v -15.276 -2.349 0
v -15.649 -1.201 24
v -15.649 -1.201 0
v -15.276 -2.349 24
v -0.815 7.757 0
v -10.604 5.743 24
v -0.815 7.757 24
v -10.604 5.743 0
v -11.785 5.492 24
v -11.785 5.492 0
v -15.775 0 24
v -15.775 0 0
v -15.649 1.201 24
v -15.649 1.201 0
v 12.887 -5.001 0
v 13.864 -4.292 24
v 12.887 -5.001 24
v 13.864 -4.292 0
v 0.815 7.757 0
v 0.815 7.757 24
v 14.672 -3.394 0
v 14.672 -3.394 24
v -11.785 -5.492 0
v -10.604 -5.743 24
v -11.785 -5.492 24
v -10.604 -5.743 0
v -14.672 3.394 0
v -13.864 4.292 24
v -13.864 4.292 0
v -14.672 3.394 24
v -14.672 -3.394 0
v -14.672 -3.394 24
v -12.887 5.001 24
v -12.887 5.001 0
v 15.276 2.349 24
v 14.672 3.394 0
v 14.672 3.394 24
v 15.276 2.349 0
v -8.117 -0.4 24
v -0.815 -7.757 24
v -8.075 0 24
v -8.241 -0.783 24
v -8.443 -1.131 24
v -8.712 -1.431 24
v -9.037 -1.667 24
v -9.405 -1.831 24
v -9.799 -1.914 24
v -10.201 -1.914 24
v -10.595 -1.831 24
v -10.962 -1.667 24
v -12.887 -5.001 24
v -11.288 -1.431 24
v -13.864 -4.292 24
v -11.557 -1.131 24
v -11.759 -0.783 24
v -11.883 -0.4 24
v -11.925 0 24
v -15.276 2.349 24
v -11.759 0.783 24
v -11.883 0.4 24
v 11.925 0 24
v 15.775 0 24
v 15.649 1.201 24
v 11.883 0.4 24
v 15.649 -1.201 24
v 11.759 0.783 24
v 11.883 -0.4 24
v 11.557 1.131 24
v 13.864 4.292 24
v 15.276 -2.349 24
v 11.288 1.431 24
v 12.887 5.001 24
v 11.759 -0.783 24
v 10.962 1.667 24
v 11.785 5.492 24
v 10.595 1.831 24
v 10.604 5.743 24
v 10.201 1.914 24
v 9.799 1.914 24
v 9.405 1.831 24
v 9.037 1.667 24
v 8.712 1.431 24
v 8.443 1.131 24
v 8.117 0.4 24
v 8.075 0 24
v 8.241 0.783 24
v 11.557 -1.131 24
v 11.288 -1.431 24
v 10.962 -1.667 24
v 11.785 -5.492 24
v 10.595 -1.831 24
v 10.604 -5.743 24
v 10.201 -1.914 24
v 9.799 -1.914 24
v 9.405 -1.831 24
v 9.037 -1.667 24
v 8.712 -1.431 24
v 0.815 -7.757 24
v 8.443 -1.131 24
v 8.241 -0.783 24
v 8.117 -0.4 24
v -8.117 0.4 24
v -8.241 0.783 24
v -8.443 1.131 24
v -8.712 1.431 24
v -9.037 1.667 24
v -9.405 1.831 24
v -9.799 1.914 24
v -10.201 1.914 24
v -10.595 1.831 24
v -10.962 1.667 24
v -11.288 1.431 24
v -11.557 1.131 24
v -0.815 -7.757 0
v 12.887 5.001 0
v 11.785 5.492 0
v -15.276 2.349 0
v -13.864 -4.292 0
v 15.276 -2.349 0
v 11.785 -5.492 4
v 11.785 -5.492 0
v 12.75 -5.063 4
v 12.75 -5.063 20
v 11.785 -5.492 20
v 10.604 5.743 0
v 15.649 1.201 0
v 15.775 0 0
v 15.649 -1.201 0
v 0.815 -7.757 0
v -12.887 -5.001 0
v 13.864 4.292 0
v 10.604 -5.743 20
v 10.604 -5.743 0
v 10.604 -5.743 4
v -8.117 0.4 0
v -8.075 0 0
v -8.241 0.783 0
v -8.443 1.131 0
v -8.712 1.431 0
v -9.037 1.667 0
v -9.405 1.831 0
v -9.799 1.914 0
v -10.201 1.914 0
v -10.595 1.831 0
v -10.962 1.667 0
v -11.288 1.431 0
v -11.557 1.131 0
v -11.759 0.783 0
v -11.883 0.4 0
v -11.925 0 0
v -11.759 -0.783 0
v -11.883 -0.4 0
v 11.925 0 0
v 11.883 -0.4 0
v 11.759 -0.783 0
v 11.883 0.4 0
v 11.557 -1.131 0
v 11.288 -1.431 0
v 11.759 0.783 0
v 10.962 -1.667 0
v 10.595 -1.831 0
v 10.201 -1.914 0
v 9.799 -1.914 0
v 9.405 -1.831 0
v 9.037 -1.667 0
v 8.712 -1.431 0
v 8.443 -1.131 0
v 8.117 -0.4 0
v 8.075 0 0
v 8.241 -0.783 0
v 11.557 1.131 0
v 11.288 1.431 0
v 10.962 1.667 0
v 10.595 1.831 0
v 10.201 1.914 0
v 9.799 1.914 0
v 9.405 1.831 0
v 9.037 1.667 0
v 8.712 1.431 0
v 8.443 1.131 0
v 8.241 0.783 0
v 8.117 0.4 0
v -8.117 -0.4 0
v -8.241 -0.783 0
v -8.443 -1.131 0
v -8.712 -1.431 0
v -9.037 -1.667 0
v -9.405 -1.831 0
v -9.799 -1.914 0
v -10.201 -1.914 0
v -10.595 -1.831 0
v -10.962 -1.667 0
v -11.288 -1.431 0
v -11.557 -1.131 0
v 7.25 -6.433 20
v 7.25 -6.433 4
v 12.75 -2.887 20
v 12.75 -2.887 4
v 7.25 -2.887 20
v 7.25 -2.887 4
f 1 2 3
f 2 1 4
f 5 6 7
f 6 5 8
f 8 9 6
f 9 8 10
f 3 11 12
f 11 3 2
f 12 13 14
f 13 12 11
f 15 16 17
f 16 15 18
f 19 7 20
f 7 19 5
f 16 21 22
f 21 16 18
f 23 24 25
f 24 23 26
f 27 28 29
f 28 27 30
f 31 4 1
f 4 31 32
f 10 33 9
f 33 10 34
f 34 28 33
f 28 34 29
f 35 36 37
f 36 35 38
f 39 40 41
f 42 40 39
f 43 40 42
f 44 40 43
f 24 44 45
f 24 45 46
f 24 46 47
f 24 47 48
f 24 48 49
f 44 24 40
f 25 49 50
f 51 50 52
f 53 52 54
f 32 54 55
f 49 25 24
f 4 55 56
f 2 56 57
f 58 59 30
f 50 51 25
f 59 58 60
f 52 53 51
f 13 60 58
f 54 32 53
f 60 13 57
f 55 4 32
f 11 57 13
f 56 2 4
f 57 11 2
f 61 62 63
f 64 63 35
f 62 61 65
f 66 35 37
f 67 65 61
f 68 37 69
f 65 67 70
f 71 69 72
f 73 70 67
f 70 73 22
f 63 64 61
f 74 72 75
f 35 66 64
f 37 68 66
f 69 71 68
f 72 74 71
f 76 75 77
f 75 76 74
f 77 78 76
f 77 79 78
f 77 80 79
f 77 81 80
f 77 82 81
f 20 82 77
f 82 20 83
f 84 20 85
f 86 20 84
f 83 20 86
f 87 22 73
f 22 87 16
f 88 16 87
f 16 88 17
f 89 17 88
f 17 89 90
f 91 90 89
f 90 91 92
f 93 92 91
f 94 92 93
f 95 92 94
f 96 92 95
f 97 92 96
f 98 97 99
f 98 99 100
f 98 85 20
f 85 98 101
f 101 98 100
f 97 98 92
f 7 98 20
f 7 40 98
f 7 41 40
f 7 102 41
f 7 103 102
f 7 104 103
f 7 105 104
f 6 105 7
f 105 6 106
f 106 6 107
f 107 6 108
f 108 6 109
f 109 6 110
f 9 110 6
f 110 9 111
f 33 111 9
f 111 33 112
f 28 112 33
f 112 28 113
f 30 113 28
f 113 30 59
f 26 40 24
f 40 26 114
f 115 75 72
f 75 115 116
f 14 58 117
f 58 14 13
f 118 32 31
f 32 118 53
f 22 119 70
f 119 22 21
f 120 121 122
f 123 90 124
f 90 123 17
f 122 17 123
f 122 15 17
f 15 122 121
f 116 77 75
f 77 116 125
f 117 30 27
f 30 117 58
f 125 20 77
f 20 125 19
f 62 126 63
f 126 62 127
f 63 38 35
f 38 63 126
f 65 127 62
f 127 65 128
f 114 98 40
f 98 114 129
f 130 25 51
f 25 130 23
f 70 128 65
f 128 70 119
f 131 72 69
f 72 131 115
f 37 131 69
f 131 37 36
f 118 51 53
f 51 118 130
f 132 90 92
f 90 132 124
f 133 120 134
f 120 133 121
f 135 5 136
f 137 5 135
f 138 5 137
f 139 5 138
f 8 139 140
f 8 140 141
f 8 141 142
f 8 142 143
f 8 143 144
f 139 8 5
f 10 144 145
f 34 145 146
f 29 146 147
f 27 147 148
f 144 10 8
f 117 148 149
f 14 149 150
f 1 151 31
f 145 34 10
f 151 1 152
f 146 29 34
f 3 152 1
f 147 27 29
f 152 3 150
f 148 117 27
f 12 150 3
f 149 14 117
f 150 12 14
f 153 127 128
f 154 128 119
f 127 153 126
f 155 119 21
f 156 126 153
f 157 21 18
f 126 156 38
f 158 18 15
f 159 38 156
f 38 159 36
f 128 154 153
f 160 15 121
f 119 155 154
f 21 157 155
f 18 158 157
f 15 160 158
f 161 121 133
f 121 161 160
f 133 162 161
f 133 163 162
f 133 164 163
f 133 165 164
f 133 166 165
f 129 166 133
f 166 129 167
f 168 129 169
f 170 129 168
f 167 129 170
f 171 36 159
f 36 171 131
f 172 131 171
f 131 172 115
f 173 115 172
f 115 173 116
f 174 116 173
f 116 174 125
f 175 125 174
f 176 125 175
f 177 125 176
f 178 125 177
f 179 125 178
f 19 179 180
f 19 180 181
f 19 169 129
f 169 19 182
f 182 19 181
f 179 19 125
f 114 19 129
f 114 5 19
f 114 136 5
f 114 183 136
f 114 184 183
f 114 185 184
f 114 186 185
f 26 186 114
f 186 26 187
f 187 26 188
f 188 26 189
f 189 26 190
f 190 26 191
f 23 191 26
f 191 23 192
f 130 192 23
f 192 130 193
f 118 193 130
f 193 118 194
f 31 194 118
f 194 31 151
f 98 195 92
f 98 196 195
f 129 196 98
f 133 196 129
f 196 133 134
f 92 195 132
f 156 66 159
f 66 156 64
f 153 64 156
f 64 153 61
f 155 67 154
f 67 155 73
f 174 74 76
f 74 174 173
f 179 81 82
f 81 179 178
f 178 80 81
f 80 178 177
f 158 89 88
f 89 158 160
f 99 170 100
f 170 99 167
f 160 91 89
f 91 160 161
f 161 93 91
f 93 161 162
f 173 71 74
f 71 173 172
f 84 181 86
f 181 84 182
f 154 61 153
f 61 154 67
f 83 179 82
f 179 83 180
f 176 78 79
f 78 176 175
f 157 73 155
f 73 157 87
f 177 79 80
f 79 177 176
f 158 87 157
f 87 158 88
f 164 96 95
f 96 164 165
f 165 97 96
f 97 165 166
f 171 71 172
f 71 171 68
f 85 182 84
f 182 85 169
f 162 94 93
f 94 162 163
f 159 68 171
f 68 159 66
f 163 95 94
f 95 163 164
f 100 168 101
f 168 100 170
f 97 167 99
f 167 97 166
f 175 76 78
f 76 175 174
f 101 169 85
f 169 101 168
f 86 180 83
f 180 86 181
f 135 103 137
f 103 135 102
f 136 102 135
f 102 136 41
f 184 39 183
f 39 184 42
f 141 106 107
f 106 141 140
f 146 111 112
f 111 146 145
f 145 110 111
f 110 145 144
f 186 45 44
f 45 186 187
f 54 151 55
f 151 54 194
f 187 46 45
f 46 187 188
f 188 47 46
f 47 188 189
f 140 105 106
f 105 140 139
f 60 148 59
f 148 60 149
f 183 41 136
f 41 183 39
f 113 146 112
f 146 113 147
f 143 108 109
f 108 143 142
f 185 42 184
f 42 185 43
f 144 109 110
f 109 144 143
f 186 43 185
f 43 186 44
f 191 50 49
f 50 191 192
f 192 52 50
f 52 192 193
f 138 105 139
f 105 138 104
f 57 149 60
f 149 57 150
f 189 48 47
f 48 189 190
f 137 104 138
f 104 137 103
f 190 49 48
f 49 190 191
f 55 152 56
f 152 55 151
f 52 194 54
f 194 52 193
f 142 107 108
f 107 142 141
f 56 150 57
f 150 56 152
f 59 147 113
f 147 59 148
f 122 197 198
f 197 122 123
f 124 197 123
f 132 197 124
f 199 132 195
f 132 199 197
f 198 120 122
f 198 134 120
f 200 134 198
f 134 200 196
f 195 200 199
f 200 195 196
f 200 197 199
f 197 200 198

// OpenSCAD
// file: metric_screw_sizes.scad
//sizes for metric screws that work
m3_clearance = 3.85;
m3_tight = 3.5;
m3_cap_clear = 6;
m3_cap_depth = 3.3;
m3_nut_clear = 7;
m3_nut_depth = 2.3;

// insert hole sizes < diameter of insert
m2_insert = 3.2;
m2_clearance = 2.1;
// main file
include <metric_screw_sizes.scad>
WallThickness = 1.8;
$fn=30;
//BallSize = 13; te ruim
//BallSize = 12.7; bijna
//BallSize = 12.4;goed
BallSize = 11.;
Airgap = .5;

TotalHeight =  18+Airgap; 		//this includes the ball
Mount = 24;//-TotalHeight; //10 layers at 0.32
MountScrewRad = m3_clearance/2;  	//3mm screw
BallProtrude = .50; 	//percentage of ball radius sticking out 
ScrewSpacing = 20;		//spaceing of the mountholes center to center
MountMiddle = false; 	//mount int the center
MountBase = true;		//use mount base 2 holes


cylrad = (BallSize/2) + WallThickness + Airgap;
echo (cylrad);


difference()
{

    base();
    translate([ScrewSpacing/2,-MountScrewRad*3,Mount/2]) {
        #cube([5.5, MountScrewRad*3,Mount-8], center = true);
    }
//    translate([0-ScrewSpacing/2,0,4]) {
//        circle( MountScrewRad*3);
//    }
}


module base()
{
	difference (){
		linear_extrude(height=Mount)
		hull() {
			translate([ScrewSpacing/2,0,0]) {
				circle(  MountScrewRad*3);
			}
			translate([0-ScrewSpacing/2,0,0]) {
				circle( MountScrewRad*3);
			}
			circle( cylrad);
		}
	
		translate([ScrewSpacing/2,0,-1]) {
			#cylinder(r1 = MountScrewRad, r2 = MountScrewRad, h= Mount+2,$fn=30);
		}
		translate([0-ScrewSpacing/2,0,-1]) {
			#cylinder(r1 = MountScrewRad, r2 = MountScrewRad, h= Mount+2,$fn=30);
			
		}

	}
}
